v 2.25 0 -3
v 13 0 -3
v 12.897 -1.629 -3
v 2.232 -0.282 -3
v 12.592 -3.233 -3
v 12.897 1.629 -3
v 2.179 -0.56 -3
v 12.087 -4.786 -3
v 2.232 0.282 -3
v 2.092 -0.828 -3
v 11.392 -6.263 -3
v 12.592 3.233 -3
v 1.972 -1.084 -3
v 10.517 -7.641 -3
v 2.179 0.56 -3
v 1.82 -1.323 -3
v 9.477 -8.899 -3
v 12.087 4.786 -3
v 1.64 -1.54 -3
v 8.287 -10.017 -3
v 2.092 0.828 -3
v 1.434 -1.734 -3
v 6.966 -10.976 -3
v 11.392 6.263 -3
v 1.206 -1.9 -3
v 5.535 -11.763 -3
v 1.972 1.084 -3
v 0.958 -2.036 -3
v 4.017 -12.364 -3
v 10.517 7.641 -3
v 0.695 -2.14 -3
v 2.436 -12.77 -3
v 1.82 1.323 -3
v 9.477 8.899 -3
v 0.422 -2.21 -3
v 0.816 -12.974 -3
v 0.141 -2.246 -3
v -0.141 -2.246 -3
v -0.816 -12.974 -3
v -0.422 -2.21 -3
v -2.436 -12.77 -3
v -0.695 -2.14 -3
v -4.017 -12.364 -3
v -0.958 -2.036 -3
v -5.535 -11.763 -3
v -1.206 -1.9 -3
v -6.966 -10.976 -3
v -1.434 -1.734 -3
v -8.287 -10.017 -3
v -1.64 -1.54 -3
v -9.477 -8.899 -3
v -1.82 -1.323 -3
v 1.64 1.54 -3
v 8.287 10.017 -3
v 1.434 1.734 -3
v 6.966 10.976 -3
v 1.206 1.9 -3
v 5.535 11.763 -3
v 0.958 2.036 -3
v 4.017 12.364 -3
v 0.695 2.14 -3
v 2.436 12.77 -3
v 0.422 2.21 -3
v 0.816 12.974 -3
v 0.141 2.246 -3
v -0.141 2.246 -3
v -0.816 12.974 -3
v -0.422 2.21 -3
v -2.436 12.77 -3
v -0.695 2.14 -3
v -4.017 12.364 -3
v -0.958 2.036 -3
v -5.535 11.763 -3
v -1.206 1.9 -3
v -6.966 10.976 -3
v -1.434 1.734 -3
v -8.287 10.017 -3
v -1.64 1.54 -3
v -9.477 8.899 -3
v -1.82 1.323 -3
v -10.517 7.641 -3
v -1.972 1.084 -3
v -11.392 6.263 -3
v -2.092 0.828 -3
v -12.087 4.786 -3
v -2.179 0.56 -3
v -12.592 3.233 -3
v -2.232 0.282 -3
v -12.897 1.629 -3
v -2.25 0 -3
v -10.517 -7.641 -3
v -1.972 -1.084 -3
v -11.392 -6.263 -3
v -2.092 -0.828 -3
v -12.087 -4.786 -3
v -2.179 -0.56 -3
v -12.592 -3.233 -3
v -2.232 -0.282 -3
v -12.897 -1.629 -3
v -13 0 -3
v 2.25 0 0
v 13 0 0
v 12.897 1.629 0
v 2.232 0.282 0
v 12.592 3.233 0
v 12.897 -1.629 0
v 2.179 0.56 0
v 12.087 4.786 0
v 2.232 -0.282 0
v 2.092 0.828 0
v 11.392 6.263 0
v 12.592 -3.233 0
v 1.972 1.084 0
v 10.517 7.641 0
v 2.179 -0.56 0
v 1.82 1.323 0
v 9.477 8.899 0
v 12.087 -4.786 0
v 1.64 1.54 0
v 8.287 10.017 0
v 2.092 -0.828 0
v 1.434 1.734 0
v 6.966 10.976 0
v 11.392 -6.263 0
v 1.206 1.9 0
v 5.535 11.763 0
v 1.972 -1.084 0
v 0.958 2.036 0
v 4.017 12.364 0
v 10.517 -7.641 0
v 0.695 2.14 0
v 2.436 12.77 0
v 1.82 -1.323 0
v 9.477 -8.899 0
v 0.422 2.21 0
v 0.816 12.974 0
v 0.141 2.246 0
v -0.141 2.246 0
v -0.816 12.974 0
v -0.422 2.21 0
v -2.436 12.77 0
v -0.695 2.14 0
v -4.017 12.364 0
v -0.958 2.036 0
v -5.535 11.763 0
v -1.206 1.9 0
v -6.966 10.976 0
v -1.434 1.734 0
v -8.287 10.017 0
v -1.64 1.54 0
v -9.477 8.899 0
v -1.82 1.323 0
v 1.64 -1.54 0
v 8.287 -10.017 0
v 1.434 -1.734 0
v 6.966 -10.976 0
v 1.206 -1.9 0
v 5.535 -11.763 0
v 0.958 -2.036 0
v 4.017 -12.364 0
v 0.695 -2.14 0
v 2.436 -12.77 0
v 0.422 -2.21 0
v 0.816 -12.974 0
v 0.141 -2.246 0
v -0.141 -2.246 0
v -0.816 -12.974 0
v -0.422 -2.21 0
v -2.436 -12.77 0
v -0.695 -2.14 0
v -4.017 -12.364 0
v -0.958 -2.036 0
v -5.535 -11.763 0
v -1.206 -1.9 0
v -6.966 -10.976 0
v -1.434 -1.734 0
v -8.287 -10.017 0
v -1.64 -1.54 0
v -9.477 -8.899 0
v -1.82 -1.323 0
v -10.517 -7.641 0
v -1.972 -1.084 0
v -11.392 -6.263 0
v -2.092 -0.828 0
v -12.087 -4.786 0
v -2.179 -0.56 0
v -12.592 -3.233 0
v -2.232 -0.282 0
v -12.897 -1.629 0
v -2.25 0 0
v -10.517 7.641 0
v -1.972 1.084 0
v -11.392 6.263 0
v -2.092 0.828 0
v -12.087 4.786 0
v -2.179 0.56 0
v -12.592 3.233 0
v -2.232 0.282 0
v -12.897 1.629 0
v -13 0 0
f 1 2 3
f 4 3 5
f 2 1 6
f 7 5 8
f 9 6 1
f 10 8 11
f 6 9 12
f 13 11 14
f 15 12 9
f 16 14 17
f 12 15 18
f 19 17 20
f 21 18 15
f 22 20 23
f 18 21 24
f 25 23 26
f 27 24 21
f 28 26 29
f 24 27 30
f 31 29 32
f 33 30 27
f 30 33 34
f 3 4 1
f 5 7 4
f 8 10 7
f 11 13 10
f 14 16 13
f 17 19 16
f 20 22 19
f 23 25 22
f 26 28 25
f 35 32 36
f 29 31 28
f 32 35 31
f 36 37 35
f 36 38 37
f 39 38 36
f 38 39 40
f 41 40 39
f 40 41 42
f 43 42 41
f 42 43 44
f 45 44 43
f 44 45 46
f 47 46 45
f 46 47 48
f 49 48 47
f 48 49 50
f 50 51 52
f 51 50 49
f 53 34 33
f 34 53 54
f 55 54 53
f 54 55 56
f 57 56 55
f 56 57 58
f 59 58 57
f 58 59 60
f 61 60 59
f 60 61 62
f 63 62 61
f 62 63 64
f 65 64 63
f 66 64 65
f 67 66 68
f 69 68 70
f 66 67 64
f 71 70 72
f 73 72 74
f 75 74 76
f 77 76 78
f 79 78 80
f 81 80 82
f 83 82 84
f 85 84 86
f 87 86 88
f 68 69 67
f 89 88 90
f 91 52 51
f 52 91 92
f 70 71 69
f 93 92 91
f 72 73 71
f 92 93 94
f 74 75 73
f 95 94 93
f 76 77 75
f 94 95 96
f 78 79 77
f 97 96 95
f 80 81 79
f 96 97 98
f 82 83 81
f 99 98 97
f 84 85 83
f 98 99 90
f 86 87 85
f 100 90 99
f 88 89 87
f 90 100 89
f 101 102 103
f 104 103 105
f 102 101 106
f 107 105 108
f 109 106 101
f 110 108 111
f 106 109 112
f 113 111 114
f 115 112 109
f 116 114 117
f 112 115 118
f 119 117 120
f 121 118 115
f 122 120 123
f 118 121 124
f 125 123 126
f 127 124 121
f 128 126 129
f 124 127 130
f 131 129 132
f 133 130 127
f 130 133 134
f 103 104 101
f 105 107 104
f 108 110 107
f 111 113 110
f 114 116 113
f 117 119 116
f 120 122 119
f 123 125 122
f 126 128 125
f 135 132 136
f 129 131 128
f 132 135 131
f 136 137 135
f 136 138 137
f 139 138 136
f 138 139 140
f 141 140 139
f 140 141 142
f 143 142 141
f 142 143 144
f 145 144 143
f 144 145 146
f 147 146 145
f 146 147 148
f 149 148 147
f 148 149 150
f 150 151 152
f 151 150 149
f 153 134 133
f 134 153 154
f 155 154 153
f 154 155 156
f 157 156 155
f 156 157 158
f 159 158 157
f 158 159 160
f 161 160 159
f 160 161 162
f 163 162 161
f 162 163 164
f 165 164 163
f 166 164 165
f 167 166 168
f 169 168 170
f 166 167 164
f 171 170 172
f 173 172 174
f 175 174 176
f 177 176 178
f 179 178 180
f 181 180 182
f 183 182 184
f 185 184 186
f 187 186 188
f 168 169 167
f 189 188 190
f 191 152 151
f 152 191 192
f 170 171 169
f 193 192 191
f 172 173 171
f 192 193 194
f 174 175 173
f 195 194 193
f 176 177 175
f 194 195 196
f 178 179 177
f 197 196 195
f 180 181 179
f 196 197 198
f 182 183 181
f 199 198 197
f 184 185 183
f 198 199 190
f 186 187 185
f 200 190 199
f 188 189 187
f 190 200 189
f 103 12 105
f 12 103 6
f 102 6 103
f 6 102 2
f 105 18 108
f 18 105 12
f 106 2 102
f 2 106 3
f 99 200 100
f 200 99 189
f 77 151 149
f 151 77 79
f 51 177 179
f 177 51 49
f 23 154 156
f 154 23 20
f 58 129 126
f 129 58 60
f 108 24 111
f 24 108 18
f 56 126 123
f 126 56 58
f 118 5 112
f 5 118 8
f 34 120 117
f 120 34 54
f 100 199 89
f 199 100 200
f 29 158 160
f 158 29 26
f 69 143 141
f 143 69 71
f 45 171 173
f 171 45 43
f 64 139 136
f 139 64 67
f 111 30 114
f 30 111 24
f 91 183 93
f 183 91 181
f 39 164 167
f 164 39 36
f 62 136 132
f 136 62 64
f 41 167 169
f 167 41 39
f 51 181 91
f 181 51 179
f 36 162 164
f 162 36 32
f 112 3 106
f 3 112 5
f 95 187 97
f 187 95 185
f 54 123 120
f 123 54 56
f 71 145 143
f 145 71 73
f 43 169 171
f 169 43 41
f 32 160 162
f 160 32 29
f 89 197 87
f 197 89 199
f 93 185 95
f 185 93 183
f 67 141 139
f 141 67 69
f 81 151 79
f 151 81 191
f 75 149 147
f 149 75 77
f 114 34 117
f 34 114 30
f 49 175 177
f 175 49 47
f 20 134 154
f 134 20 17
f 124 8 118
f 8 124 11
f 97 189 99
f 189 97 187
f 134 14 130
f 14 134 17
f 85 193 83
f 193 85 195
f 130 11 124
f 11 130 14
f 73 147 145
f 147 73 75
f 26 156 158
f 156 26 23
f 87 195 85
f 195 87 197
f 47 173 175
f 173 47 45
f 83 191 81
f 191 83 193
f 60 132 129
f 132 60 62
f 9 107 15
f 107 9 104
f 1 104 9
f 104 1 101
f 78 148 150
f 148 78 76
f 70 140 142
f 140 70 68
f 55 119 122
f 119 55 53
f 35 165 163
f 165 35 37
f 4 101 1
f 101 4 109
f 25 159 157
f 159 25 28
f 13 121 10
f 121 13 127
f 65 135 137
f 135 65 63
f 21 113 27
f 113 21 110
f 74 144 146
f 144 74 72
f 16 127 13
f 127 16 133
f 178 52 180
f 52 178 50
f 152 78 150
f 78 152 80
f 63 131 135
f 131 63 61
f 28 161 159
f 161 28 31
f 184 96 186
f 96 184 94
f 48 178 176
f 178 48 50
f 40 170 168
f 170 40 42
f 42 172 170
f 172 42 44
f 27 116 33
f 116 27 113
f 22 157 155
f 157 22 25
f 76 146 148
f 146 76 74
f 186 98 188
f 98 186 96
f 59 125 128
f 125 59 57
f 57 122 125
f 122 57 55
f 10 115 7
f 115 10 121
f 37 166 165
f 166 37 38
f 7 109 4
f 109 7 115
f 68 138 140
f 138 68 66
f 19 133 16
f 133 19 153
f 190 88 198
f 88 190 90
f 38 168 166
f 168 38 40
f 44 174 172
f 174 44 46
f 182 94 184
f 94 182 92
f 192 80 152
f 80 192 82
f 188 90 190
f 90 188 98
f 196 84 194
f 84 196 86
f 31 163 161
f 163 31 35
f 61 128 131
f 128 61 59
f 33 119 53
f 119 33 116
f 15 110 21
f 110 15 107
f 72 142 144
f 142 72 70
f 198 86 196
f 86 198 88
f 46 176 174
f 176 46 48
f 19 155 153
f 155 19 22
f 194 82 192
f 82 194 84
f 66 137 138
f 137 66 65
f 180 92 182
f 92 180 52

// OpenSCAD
$fn = 50;


difference() {
	union() {
		translate(v = [0, 0, -3.0000000000]) {
			cylinder(h = 3, r = 7.0000000000);
		}
		translate(v = [0, 0, -3.0000000000]) {
			cylinder(h = 3, r = 13.0000000000);
		}
	}
	union() {
		#translate(v = [0, 0, -3]) {
			cylinder(h = 3, r = 2.2500000000);
		}
	}
}
